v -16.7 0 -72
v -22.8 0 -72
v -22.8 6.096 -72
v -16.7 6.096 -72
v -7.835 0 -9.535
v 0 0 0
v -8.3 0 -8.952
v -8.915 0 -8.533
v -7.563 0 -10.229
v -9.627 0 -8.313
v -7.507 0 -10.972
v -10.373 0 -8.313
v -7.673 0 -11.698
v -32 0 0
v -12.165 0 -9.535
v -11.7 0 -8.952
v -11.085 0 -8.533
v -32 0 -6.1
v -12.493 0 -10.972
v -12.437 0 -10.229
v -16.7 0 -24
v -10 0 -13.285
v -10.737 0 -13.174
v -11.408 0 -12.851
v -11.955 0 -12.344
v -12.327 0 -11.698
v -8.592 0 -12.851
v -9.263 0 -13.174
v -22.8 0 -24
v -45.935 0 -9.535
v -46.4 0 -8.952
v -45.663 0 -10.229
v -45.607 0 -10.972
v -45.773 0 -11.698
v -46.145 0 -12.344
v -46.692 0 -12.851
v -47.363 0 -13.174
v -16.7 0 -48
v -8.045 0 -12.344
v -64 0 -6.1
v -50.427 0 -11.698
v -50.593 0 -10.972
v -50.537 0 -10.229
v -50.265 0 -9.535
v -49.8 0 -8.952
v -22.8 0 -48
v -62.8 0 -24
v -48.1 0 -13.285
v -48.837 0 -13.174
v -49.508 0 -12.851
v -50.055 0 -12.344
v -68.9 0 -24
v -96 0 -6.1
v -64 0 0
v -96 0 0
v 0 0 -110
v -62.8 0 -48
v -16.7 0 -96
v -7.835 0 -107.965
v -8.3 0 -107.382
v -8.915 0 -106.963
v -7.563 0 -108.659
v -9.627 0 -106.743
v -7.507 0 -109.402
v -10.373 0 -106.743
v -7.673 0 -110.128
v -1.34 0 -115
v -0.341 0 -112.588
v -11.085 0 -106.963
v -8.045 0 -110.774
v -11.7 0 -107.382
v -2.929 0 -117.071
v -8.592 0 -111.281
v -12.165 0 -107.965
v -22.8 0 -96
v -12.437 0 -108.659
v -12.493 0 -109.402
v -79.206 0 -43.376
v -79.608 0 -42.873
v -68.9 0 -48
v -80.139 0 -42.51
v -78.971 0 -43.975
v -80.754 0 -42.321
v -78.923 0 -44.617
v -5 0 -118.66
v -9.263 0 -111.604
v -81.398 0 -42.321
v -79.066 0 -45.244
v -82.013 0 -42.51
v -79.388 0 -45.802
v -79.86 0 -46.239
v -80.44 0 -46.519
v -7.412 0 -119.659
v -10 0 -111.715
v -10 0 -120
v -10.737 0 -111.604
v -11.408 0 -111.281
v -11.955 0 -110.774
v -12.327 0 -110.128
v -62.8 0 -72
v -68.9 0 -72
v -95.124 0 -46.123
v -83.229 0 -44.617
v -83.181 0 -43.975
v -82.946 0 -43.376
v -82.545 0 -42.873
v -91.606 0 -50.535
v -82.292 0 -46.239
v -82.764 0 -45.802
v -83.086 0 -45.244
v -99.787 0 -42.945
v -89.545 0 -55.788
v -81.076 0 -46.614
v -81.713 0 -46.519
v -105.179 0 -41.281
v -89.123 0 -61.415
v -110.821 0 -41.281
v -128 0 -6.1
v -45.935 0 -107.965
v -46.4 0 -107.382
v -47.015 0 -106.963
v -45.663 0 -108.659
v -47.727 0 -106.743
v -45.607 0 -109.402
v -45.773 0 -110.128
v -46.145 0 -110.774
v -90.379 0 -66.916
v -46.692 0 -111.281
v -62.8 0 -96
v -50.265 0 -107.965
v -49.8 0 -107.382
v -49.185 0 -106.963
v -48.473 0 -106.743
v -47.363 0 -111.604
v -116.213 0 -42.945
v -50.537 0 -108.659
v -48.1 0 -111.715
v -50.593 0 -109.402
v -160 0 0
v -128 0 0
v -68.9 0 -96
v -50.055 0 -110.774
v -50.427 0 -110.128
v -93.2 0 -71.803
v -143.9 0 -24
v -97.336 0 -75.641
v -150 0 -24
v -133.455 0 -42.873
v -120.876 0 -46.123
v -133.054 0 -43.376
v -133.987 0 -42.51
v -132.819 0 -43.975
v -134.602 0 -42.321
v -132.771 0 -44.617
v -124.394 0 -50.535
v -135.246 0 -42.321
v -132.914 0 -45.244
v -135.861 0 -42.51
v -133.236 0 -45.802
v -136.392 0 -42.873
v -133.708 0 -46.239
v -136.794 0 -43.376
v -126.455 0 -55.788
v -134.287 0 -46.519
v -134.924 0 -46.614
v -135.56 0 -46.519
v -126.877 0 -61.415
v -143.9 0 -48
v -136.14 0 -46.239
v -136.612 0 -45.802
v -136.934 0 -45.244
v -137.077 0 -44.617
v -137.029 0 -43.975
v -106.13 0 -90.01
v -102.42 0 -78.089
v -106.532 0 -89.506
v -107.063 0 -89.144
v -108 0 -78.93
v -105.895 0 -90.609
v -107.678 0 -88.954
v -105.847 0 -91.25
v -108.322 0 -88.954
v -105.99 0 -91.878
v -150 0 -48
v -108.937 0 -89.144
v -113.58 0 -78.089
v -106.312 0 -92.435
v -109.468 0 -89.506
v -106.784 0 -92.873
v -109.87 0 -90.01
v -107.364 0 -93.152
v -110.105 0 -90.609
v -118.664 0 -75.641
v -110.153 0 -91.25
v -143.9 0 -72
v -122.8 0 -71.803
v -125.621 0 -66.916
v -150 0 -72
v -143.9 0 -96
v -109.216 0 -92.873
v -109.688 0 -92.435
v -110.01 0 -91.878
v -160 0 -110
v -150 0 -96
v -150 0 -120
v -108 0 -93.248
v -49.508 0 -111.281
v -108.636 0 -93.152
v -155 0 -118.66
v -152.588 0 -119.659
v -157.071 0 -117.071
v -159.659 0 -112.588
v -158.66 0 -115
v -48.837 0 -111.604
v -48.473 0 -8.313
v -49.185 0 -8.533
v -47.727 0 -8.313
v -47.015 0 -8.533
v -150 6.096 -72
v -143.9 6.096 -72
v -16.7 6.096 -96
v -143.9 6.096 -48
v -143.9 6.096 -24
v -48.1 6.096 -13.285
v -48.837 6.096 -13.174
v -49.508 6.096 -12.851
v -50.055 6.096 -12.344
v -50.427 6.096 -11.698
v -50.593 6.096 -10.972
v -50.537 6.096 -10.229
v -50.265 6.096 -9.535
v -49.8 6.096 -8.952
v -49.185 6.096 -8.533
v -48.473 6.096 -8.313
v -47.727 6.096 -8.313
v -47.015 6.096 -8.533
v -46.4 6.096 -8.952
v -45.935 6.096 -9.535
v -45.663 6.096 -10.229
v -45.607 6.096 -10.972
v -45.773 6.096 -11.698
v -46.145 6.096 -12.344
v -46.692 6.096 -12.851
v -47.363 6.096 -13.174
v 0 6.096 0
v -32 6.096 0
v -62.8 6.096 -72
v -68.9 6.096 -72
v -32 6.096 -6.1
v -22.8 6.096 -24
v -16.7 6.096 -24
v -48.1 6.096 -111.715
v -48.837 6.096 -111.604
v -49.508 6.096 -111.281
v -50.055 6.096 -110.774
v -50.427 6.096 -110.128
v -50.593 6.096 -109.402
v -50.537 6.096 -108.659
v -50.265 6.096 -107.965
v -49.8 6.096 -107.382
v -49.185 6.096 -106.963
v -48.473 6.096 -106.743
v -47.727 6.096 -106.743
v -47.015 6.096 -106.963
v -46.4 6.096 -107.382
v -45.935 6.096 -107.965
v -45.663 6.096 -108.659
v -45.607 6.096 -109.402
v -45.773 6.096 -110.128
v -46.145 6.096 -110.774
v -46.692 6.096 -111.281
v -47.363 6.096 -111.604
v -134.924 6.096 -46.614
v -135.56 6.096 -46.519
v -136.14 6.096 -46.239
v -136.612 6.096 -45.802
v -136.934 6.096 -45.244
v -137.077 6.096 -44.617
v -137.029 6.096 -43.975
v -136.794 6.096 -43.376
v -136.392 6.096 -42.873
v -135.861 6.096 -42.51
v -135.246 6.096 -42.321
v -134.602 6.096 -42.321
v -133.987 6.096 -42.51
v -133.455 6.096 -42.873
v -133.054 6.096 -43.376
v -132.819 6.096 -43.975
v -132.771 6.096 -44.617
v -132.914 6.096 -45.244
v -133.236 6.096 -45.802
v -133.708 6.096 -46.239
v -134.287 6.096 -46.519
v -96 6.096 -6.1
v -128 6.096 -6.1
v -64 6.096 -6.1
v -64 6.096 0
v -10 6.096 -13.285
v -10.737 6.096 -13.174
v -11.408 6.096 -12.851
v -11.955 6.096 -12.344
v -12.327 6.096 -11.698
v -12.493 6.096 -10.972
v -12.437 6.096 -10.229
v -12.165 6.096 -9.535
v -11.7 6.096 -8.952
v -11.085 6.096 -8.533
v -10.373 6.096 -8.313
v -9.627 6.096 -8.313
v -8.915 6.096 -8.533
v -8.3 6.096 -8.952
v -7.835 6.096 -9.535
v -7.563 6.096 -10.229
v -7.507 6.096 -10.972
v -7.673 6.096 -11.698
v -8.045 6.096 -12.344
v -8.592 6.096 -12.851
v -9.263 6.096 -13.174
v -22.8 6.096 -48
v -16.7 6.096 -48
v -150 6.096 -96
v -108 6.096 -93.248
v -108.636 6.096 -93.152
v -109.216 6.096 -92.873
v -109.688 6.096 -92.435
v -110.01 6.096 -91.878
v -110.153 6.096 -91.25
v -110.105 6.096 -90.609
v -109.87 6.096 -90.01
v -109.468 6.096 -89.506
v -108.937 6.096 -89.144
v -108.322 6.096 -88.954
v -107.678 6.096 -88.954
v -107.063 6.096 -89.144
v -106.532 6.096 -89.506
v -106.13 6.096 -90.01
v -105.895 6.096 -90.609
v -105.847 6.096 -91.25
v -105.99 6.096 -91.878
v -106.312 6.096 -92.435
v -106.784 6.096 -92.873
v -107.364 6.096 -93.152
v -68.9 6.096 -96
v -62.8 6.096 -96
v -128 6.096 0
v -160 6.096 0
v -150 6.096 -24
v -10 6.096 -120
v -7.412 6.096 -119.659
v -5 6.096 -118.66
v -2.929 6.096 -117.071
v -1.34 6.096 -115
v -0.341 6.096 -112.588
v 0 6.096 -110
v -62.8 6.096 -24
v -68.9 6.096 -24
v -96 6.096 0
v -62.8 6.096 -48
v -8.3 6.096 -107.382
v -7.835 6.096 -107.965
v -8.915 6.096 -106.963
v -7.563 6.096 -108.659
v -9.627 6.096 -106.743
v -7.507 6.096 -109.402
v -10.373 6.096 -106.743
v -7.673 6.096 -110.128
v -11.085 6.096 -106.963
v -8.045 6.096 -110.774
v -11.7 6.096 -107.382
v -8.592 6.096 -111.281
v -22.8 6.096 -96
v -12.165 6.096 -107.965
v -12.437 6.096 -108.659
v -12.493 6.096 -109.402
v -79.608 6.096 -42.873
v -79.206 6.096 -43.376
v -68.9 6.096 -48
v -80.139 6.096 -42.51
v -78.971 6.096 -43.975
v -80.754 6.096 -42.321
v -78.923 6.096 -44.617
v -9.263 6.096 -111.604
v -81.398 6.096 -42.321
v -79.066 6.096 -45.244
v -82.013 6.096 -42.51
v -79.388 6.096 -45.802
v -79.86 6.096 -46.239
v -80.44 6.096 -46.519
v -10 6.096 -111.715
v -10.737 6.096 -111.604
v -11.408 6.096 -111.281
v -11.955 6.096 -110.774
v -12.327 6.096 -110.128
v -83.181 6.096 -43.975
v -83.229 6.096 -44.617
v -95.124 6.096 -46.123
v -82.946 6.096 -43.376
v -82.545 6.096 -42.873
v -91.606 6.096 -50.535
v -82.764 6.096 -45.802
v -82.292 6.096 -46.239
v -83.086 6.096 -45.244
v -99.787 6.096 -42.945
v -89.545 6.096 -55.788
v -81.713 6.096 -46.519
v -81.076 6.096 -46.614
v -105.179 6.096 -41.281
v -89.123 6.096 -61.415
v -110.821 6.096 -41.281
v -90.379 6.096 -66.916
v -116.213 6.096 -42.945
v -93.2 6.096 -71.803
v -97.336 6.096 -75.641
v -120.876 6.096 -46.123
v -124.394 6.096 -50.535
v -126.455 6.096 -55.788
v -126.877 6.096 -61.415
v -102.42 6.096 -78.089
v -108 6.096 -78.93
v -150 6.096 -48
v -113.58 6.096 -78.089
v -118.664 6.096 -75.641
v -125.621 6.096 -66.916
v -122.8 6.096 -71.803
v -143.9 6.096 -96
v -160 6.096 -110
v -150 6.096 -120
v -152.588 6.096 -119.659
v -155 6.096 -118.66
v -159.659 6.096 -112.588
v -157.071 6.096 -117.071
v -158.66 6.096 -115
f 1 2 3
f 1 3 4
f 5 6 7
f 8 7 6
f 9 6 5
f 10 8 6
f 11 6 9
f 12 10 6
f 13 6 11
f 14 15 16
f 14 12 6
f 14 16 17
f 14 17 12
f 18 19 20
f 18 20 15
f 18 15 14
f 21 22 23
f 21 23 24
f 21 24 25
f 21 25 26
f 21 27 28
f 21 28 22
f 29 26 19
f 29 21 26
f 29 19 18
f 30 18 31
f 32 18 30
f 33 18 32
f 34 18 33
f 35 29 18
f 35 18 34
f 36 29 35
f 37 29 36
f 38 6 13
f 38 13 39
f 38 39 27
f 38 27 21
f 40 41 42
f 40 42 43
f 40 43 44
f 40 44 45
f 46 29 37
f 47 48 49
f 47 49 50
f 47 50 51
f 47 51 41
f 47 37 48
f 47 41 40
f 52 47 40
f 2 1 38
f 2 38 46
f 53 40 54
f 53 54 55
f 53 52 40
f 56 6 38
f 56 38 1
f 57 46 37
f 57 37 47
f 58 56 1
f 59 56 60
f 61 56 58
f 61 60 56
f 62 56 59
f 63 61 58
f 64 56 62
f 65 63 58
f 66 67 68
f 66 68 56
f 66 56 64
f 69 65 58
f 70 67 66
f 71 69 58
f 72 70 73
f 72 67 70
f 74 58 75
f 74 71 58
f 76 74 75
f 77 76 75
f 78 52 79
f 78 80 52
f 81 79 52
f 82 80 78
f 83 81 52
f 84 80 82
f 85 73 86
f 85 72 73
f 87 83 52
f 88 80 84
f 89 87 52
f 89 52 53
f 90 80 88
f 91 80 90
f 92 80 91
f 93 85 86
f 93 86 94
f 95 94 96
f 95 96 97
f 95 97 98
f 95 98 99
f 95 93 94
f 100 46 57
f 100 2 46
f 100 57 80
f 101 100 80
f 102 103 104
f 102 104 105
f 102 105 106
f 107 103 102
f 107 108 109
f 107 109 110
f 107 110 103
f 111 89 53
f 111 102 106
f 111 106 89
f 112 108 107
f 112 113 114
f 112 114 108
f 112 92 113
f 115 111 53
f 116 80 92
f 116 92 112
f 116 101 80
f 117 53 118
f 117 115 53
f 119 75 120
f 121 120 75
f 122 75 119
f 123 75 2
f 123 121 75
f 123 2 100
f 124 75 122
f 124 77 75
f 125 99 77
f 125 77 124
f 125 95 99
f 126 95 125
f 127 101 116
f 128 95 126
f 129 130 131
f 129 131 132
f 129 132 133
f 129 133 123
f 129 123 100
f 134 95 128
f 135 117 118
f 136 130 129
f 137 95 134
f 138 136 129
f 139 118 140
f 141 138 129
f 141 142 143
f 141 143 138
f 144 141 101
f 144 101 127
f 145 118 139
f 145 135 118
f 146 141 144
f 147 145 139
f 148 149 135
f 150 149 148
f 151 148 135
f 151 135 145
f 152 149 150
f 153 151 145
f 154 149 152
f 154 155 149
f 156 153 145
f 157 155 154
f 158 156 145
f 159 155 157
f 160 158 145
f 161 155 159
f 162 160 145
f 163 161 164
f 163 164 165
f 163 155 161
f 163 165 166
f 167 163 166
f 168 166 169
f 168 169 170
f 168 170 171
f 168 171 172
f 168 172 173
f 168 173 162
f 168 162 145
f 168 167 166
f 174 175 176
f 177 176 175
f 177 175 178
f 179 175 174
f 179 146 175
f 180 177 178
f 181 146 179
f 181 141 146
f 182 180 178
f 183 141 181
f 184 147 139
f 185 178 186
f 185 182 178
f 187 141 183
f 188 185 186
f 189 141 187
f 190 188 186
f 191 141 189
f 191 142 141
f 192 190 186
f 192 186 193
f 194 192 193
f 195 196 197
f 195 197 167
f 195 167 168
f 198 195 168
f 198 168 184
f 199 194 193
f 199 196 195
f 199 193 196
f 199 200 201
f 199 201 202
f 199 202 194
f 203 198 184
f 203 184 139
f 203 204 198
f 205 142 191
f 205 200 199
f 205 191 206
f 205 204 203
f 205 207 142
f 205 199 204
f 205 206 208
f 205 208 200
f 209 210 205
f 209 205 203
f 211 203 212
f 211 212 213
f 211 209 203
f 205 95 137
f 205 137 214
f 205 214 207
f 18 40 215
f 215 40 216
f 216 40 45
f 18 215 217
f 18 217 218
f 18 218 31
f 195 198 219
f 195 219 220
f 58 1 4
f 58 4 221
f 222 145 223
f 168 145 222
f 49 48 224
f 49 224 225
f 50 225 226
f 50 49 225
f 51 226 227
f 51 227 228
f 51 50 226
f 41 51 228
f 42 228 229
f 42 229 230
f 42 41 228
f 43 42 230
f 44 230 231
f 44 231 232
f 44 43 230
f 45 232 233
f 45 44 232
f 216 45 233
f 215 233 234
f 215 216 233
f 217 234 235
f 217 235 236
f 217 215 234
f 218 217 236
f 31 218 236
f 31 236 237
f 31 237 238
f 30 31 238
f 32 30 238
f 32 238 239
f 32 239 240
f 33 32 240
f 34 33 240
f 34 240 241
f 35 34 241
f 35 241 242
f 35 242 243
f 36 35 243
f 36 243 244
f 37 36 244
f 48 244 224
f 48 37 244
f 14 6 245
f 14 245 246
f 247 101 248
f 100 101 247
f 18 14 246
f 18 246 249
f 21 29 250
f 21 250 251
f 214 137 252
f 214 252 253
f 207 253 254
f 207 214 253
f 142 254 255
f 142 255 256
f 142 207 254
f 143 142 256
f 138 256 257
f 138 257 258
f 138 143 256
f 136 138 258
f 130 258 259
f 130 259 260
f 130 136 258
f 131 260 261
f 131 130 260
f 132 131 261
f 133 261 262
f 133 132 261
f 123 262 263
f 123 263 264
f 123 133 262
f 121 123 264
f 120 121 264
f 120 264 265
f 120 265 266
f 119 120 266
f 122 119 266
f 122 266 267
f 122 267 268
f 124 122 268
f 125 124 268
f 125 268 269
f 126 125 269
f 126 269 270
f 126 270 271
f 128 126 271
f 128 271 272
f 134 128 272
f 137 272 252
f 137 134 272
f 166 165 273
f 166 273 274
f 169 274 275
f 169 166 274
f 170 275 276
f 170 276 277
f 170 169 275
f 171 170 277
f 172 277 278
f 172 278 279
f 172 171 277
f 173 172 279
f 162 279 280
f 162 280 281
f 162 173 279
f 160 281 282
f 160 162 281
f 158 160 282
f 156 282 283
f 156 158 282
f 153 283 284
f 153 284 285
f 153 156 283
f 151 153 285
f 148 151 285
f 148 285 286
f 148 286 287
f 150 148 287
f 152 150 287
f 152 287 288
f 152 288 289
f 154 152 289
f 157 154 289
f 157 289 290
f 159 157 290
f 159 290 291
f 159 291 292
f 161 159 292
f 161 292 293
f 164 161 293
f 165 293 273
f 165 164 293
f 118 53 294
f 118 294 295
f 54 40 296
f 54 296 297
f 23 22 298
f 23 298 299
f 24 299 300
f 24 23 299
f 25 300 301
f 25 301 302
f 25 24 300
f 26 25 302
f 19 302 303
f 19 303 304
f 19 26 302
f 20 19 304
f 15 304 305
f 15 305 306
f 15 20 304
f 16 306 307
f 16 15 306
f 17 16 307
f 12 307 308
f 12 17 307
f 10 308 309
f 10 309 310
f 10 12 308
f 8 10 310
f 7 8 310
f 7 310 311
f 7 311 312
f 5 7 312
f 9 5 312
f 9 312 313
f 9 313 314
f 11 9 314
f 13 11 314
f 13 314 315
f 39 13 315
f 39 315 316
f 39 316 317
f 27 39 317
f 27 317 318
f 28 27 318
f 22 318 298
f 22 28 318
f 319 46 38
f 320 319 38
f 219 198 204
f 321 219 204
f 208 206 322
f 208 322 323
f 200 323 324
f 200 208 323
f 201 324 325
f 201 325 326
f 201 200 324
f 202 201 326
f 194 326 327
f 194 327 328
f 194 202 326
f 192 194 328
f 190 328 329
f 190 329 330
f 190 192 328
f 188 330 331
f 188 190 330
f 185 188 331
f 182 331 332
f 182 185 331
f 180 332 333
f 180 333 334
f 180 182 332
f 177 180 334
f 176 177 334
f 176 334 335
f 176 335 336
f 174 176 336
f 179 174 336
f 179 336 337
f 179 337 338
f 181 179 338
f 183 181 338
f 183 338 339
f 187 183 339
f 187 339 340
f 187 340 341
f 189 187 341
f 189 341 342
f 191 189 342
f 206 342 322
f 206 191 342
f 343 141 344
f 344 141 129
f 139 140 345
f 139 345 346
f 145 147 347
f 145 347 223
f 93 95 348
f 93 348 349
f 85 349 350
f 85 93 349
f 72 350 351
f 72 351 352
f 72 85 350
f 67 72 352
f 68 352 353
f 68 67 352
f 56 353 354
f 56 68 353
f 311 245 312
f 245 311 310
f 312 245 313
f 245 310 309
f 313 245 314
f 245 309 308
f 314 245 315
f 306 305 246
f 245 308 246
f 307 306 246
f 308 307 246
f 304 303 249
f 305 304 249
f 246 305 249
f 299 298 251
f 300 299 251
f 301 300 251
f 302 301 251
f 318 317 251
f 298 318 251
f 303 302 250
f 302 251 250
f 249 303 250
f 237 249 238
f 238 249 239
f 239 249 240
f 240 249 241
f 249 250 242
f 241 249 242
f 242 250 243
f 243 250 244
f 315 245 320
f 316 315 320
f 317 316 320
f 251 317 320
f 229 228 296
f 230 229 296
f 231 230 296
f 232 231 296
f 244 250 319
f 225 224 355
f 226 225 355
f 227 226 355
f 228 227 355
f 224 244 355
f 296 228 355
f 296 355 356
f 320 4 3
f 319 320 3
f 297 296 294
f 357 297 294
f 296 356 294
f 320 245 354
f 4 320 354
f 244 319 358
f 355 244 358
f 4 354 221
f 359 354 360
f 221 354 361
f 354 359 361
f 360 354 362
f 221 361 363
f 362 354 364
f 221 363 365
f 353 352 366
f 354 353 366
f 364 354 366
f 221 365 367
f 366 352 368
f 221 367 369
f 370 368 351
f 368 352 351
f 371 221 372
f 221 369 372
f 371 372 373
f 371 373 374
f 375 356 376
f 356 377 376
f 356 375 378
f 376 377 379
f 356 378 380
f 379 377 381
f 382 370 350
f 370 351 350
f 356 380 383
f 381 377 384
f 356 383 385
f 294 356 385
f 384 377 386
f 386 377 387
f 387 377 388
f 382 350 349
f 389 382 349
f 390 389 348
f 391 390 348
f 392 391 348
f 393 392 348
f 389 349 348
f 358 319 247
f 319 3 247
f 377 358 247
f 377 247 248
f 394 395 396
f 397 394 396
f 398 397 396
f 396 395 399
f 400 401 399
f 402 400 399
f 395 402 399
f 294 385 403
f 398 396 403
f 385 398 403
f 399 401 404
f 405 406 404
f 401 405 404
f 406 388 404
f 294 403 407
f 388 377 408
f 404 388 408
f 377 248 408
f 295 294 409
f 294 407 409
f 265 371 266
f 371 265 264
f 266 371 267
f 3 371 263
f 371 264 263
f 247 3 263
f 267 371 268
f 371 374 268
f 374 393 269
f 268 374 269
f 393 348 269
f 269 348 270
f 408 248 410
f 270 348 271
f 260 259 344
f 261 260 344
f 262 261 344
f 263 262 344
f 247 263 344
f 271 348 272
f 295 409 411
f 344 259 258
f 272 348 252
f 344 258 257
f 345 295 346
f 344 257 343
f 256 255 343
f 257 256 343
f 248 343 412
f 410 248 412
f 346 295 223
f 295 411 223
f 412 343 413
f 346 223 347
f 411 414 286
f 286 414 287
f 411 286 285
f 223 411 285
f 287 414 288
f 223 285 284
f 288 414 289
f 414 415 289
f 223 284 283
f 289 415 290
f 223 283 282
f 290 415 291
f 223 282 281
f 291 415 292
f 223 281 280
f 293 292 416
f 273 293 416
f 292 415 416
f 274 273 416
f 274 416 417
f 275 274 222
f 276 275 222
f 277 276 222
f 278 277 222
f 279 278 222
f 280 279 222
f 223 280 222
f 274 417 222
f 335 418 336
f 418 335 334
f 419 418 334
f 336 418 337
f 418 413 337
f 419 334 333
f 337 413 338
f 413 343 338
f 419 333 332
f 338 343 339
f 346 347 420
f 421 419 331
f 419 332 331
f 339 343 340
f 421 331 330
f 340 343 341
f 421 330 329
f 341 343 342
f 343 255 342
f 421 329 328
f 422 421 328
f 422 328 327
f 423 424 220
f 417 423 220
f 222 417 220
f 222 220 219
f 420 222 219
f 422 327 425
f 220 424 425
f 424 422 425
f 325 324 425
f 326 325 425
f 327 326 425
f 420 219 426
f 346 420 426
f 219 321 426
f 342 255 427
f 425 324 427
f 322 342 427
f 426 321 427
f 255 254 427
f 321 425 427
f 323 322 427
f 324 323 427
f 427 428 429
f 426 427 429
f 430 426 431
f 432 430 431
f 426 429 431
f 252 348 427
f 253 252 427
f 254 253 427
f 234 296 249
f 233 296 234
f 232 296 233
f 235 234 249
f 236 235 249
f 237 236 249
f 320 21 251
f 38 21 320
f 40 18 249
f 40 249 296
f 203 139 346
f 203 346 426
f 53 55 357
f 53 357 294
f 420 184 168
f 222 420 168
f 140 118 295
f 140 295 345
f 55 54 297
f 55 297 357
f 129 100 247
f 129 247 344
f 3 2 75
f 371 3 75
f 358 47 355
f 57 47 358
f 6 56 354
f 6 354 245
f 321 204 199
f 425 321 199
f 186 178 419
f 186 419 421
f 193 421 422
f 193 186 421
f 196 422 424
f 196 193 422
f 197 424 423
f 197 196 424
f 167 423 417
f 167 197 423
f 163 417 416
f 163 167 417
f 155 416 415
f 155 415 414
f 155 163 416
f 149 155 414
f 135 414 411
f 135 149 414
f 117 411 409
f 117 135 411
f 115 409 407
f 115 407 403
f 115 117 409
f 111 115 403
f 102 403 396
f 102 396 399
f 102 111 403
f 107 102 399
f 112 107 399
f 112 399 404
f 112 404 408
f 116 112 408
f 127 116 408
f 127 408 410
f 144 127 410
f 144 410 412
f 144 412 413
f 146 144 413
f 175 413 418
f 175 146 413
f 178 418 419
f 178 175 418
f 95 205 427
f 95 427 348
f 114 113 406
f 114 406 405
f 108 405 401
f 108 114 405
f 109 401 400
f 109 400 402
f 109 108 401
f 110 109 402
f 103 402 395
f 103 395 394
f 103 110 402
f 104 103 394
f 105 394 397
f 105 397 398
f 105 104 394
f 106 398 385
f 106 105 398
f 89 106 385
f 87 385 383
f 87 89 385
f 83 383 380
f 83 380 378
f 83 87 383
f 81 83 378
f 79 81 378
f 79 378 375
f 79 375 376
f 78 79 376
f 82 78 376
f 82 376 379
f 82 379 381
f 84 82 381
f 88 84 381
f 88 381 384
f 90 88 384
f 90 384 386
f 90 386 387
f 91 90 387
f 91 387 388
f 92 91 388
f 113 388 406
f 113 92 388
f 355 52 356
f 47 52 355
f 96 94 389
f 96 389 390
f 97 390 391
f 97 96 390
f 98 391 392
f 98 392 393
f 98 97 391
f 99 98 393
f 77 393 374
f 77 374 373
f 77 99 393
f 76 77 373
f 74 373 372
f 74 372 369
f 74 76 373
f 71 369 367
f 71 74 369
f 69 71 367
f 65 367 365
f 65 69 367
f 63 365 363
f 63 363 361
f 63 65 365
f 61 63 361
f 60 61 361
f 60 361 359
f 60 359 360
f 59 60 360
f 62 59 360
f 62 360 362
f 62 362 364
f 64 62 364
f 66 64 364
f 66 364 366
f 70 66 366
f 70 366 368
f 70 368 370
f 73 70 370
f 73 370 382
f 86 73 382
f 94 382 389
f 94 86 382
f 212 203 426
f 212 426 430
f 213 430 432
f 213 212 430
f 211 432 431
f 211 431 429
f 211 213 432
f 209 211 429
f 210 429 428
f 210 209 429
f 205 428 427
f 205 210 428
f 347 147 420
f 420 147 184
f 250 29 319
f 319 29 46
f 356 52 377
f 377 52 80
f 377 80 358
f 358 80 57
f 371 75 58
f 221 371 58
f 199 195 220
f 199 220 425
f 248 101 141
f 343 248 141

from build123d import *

# Parameters (mm, degrees)
SKETCH1_R           = 18.93
SKETCH1_R_2         = 2.159
SKETCH1_R_3         = 2.5
SKETCH1_W           = 6.1
SKETCH1_H           = 24
BOSS_EXTRUDE1_DEPTH = 6.096


with BuildPart() as part:
    # Sketch1 → Boss-Extrude1 (new body)
    with BuildSketch(Plane(origin=(0, 0, 0), x_dir=(1, 0, 0), z_dir=(0, 1, 0))):
        with BuildLine():
            Line((-150, 120), (-10, 120))
            ThreePointArc((-10, 120), (-2.928932188, 117.071067812), (0, 110))
            Line((0, 110), (0, 0))
            Line((0, 0), (-32, 0))
            Line((-32, 0), (-32, 6.1))
            Line((-32, 6.1), (-64, 6.1))
            Line((-64, 6.1), (-64, 0))
            Line((-64, 0), (-96, 0))
            Line((-96, 0), (-96, 6.1))
            Line((-96, 6.1), (-128, 6.1))
            Line((-128, 6.1), (-128, 0))
            Line((-128, 0), (-160, 0))
            Line((-160, 0), (-160, 110))
            ThreePointArc((-160, 110), (-157.071067812, 117.071067812), (-150, 120))
        make_face()
        with Locations(Location((-108, 60, 0), (0, 0, 90))):
            Circle(SKETCH1_R, mode=Mode.SUBTRACT)
        with Locations(Location((-108, 91.089, 0), (0, 0, 90))):
            Circle(SKETCH1_R_2, mode=Mode.SUBTRACT)
        with Locations(Location((-81.076136222, 44.4555, 0), (0, 0, 90))):
            Circle(SKETCH1_R_2, mode=Mode.SUBTRACT)
        with Locations(Location((-134.923863778, 44.4555, 0), (0, 0, 90))):
            Circle(SKETCH1_R_2, mode=Mode.SUBTRACT)
        with Locations(Location((-48.1, 109.215, 0), (0, 0, 90))):
            Circle(SKETCH1_R_3, mode=Mode.SUBTRACT)
        with Locations(Location((-48.1, 10.785, 0), (0, 0, 90))):
            Circle(SKETCH1_R_3, mode=Mode.SUBTRACT)
        with Locations(Location((-10, 10.785, 0), (0, 0, 90))):
            Circle(SKETCH1_R_3, mode=Mode.SUBTRACT)
        with Locations(Location((-10, 109.215, 0), (0, 0, 90))):
            Circle(SKETCH1_R_3, mode=Mode.SUBTRACT)
        with Locations((-146.95, 84)):
            Rectangle(SKETCH1_W, SKETCH1_H, mode=Mode.SUBTRACT)
        with Locations((-146.95, 36)):
            Rectangle(SKETCH1_W, SKETCH1_H, mode=Mode.SUBTRACT)
        with Locations((-65.85, 84)):
            Rectangle(SKETCH1_W, SKETCH1_H, mode=Mode.SUBTRACT)
        with Locations((-65.85, 36)):
            Rectangle(SKETCH1_W, SKETCH1_H, mode=Mode.SUBTRACT)
        with Locations((-19.75, 36)):
            Rectangle(SKETCH1_W, SKETCH1_H, mode=Mode.SUBTRACT)
        with Locations((-19.75, 84)):
            Rectangle(SKETCH1_W, SKETCH1_H, mode=Mode.SUBTRACT)
    extrude(amount=BOSS_EXTRUDE1_DEPTH)


solid = part.part
